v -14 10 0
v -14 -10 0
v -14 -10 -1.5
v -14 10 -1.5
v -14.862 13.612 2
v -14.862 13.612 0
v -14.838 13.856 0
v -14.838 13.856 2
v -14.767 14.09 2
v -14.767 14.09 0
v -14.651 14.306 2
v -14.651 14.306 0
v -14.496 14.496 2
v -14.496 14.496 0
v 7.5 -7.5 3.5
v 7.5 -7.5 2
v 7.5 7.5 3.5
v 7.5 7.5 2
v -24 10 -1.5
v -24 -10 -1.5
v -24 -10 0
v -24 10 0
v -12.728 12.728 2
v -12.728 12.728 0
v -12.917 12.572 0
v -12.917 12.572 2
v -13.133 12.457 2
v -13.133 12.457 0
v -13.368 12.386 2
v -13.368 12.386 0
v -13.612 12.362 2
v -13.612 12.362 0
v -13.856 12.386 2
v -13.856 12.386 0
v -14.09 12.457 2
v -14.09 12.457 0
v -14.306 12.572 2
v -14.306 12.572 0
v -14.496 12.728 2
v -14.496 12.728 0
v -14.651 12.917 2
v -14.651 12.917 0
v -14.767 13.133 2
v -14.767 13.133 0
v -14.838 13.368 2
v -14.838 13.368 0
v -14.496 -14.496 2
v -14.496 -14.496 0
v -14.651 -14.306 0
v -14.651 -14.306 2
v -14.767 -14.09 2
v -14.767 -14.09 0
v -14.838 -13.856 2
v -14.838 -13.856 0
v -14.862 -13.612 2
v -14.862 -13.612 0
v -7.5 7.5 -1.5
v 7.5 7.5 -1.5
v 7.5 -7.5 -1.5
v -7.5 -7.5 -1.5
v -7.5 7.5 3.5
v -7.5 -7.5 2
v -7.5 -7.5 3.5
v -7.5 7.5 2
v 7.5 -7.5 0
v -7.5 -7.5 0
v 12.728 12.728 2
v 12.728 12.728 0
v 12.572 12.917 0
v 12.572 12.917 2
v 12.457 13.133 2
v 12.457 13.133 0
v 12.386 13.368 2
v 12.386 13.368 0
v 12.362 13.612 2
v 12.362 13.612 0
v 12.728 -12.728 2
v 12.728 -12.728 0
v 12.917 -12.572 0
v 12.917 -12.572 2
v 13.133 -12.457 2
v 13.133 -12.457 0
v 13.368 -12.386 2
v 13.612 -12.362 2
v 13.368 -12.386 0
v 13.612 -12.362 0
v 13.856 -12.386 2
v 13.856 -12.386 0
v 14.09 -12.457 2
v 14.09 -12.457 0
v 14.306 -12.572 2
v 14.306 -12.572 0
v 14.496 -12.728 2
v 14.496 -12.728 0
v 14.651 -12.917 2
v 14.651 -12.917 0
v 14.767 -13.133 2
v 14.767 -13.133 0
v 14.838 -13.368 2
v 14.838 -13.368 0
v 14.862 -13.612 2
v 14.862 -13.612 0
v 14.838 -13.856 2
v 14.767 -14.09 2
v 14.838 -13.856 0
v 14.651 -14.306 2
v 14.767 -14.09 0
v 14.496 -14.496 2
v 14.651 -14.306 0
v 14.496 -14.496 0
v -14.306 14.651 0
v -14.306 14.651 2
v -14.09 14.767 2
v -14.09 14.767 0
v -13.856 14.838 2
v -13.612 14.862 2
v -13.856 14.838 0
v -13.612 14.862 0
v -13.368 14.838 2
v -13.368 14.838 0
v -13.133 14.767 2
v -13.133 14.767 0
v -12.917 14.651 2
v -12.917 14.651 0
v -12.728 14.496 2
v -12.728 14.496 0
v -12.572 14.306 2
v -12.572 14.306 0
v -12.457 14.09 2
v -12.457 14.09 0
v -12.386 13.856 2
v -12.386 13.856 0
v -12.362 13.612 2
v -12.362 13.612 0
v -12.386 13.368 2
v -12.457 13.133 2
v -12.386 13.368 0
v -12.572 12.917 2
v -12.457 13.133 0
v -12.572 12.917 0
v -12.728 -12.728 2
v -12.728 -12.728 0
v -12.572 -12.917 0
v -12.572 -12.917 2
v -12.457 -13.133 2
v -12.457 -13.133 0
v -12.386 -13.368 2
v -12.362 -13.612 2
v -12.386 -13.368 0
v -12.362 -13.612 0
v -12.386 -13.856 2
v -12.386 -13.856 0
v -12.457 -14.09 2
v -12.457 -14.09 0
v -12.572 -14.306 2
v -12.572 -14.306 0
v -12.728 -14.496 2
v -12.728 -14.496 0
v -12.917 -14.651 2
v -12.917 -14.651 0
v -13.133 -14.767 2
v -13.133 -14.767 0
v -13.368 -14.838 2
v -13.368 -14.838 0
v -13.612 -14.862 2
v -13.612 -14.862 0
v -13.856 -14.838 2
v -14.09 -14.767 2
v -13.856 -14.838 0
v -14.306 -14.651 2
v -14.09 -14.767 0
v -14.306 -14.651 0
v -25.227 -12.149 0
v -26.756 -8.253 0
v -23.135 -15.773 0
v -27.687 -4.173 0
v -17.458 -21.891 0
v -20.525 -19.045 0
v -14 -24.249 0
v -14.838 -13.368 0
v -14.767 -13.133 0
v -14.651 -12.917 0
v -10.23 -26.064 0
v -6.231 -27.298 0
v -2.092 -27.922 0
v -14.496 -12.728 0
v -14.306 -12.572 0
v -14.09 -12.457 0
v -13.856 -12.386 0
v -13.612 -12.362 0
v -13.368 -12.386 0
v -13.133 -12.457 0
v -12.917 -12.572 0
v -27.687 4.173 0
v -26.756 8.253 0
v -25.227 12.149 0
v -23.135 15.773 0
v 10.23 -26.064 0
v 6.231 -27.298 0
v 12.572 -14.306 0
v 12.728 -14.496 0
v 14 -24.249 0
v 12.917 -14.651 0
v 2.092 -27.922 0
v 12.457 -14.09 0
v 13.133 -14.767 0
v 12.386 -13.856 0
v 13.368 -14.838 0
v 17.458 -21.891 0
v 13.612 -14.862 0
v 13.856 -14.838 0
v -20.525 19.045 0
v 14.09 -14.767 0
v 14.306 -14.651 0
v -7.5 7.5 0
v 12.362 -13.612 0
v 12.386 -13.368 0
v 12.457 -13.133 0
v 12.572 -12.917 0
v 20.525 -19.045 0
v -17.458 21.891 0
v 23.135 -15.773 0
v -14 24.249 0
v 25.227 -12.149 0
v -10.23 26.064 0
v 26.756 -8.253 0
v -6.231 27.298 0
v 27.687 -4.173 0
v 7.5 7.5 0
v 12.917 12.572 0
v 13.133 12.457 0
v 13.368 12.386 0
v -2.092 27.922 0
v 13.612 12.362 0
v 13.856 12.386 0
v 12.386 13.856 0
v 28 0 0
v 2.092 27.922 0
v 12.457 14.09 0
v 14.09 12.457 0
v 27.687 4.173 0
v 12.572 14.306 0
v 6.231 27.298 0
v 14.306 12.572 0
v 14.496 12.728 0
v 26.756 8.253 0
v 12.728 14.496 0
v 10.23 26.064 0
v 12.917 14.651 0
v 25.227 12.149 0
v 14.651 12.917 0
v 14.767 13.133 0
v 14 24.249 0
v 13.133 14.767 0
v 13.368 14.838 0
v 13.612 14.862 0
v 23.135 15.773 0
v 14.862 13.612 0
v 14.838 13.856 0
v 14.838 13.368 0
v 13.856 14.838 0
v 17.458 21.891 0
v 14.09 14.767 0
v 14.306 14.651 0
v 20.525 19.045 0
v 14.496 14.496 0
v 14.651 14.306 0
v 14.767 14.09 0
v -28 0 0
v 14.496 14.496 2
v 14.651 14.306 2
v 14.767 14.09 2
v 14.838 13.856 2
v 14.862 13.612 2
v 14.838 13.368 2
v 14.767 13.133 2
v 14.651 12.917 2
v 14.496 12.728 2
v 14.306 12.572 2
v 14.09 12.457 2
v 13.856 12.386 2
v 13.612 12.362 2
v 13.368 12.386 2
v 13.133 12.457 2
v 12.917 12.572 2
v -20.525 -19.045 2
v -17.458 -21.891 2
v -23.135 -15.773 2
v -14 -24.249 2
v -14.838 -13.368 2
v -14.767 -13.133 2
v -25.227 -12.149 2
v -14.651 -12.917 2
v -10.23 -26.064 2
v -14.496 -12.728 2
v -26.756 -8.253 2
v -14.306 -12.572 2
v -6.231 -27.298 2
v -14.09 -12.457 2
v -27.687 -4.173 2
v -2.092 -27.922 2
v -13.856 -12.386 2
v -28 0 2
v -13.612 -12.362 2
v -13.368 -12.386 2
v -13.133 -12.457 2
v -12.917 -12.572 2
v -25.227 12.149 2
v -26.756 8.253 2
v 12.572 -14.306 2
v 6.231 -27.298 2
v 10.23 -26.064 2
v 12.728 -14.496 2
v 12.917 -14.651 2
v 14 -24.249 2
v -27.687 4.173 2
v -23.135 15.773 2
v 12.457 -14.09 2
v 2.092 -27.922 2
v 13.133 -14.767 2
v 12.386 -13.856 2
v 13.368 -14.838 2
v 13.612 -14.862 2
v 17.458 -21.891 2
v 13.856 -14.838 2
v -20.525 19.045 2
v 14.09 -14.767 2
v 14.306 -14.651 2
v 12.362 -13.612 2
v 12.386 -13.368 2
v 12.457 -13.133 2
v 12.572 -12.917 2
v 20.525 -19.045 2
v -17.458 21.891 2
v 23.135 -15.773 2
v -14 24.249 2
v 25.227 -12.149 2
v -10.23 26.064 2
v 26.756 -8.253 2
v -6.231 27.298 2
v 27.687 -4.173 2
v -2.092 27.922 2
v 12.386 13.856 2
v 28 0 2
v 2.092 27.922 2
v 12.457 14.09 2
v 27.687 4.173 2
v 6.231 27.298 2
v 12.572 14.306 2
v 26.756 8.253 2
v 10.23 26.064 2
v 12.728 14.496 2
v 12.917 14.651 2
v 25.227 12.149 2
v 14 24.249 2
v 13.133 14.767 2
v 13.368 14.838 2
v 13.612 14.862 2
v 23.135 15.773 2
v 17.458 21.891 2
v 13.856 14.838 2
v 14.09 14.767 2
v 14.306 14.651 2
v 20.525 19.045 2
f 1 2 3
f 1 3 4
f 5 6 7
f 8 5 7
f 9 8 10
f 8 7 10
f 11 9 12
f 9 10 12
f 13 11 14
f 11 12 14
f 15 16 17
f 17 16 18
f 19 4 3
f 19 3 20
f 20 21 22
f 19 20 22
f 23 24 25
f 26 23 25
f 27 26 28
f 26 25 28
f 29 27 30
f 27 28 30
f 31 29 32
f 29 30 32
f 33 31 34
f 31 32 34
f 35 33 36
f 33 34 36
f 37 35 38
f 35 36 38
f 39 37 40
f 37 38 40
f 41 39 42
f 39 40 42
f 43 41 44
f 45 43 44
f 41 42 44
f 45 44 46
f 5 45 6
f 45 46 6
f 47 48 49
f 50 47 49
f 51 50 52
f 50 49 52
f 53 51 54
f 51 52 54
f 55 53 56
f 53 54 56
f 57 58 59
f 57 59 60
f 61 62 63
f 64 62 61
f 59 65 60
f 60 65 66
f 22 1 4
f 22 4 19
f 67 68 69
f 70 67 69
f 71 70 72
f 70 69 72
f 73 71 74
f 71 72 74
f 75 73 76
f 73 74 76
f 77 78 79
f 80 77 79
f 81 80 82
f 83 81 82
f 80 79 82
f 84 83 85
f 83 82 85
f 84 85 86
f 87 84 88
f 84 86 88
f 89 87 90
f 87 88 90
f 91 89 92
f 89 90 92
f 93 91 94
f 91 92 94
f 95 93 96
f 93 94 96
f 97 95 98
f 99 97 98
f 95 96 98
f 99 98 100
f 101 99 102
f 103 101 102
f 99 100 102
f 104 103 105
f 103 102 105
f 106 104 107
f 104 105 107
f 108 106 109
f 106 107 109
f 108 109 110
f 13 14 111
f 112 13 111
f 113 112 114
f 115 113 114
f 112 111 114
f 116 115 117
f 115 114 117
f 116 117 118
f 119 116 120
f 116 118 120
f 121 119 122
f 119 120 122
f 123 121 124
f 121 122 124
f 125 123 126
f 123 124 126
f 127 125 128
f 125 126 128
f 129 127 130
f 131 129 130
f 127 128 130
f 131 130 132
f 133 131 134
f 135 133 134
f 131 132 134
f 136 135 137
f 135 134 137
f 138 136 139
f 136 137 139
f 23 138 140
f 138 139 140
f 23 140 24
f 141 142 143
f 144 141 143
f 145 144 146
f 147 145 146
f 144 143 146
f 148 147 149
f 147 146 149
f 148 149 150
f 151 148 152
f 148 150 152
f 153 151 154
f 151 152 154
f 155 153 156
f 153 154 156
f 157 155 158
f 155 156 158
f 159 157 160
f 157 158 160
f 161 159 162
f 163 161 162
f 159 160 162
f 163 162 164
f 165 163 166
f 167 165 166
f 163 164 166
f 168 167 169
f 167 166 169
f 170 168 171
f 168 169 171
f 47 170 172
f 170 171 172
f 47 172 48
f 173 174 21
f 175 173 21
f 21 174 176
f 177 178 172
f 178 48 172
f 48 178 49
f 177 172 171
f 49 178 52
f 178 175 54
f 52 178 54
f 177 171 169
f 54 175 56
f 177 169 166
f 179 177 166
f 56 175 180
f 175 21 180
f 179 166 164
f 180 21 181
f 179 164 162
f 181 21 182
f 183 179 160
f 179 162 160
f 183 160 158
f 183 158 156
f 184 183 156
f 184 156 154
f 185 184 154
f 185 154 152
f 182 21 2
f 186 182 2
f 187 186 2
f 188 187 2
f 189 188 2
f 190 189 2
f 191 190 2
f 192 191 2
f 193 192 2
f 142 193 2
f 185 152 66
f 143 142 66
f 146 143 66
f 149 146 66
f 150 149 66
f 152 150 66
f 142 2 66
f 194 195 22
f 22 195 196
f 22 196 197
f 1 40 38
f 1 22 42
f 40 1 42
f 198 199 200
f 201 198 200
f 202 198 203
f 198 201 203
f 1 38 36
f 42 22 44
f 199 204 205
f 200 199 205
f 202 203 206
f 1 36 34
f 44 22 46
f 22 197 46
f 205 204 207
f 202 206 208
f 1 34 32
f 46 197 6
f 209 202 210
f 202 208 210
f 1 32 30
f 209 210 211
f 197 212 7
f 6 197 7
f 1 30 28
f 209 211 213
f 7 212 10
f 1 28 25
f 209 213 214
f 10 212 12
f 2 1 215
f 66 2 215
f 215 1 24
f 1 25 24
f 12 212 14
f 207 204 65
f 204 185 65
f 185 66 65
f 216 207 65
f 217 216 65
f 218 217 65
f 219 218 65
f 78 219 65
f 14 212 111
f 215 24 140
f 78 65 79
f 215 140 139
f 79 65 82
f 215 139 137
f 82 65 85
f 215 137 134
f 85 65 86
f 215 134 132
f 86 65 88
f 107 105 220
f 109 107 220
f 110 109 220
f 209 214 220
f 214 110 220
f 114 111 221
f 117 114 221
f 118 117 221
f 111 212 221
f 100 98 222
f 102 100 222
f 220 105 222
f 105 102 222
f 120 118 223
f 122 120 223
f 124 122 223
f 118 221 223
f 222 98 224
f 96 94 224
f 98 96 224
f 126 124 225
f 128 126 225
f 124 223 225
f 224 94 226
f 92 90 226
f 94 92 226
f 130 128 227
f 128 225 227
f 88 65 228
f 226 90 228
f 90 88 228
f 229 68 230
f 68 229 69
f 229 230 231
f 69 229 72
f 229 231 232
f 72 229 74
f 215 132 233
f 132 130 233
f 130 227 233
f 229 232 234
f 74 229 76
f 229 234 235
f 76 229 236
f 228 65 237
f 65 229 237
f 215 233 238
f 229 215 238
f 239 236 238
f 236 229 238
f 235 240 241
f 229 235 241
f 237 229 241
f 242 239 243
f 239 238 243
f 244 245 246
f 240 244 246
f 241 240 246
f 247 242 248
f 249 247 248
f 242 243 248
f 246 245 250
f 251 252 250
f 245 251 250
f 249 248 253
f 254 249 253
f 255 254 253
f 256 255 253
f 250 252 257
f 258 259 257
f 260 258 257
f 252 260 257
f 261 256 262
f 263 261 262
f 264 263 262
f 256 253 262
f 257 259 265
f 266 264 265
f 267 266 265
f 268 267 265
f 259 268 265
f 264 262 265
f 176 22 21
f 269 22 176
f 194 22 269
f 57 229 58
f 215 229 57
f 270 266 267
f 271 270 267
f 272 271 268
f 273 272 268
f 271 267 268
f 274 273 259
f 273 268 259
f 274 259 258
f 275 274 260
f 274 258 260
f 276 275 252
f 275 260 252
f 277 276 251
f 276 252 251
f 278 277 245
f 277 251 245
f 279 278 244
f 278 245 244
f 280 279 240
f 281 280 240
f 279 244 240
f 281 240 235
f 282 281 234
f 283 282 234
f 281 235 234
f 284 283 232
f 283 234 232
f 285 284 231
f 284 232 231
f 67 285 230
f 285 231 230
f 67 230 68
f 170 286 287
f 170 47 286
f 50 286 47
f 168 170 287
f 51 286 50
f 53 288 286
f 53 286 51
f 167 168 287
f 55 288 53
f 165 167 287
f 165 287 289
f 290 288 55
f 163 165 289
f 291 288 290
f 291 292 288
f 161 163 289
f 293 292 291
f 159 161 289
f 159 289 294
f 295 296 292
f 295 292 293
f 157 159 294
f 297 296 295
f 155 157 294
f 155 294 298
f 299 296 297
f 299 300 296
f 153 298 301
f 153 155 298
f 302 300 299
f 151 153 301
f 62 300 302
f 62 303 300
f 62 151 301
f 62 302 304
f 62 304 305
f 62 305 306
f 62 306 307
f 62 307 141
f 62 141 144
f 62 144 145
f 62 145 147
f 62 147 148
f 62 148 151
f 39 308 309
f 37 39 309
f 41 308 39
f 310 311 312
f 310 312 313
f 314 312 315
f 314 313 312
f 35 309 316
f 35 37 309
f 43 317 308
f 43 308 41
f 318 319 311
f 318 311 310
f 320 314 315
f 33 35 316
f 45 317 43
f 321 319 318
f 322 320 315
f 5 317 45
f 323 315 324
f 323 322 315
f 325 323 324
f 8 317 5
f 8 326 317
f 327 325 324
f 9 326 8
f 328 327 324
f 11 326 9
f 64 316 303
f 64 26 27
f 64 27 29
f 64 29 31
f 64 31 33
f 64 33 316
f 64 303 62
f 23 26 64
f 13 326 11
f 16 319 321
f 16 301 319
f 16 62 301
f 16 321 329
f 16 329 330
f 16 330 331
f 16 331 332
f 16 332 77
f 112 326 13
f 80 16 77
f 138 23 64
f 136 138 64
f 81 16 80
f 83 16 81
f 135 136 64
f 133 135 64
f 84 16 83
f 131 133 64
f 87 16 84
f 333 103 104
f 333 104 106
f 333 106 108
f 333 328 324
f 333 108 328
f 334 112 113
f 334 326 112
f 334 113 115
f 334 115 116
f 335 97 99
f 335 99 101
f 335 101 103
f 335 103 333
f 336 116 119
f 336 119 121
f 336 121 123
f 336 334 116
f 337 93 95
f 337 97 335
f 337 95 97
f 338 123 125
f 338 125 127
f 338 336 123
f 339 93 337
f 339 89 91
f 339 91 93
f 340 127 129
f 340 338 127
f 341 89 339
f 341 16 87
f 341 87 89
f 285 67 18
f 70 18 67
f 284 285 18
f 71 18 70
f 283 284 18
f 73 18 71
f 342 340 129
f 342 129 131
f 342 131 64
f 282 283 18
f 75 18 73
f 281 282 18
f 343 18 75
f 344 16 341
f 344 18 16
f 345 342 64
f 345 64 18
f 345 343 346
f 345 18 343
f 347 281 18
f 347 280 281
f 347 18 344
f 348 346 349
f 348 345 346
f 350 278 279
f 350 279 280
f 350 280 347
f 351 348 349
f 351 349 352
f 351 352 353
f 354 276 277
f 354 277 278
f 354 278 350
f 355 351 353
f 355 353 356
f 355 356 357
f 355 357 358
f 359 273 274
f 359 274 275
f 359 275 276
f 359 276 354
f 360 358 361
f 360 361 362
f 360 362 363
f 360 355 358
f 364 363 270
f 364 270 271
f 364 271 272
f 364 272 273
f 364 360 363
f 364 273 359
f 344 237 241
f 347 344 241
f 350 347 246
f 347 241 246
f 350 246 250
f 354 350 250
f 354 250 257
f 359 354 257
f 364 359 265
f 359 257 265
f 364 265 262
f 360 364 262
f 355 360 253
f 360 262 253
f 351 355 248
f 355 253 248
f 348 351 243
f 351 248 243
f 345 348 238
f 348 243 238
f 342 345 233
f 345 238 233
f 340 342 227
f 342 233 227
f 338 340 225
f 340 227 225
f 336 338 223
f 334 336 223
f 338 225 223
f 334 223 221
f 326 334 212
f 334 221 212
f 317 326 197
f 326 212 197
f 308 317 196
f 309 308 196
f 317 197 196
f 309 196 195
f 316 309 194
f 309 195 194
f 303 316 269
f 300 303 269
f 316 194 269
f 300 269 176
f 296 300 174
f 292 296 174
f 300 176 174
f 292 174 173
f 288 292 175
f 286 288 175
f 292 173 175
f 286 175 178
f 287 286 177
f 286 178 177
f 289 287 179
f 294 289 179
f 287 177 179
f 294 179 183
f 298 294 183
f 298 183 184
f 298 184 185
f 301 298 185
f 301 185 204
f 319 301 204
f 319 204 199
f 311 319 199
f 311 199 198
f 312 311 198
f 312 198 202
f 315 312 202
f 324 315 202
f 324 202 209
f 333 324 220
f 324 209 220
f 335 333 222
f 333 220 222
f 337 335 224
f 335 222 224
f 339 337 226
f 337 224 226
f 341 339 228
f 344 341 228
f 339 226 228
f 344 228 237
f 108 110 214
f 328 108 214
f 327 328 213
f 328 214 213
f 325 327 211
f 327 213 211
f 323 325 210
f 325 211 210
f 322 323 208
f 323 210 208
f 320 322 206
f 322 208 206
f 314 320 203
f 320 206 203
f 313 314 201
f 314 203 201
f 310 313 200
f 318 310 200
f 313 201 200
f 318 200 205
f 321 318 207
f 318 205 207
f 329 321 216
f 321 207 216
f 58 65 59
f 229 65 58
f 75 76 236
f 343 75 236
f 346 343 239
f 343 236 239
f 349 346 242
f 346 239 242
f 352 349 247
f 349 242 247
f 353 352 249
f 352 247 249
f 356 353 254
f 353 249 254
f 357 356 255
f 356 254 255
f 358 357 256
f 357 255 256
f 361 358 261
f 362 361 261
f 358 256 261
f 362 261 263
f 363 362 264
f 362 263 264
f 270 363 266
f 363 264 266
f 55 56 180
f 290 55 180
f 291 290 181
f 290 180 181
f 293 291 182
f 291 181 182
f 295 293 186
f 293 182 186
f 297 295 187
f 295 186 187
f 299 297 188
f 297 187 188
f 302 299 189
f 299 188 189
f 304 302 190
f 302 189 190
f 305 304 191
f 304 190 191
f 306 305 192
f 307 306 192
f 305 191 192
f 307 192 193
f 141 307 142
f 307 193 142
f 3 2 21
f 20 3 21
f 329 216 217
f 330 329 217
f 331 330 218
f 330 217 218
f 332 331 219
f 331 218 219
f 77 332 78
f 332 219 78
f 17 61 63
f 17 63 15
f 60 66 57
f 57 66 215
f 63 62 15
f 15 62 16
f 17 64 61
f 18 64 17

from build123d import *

# Parameters (mm, degrees)
SKETCH_1_R          = 28
EXTRUDE_1_DEPTH     = 2
SKETCH_2_W          = 15
SKETCH_2_H          = 15
EXTRUDE_2_DEPTH     = 1.5
SKETCH_4_W          = 10
SKETCH_4_H          = 20
EXTRUDE_3_DEPTH     = 1.5
SKETCH_5_W          = 15
SKETCH_5_H          = 15
EXTRUDE_4_DEPTH     = 1.5
CUT_EXTRUDE_1_DEPTH = 10


with BuildPart() as part:
    # 草图1 → 凸台-拉伸1 (new body)
    with BuildSketch(Plane.XY):
        Circle(SKETCH_1_R)
    extrude(amount=EXTRUDE_1_DEPTH)

    # 草图2 → 凸台-拉伸2 (add)
    with BuildSketch(Plane.XY.offset(2)):
        Rectangle(SKETCH_2_W, SKETCH_2_H)
    extrude(amount=EXTRUDE_2_DEPTH)

    # 草图4 → 凸台-拉伸3 (add)
    with BuildSketch(Plane(origin=(0, 0, 0), x_dir=(-1, 0, 0), z_dir=(0, 0, -1))):
        with Locations((19, 0)):
            Rectangle(SKETCH_4_W, SKETCH_4_H)
    extrude(amount=EXTRUDE_3_DEPTH)

    # 草图5 → 凸台-拉伸4 (add)
    with BuildSketch(Plane(origin=(0, 0, 0), x_dir=(-1, 0, 0), z_dir=(0, 0, -1))):
        Rectangle(SKETCH_5_W, SKETCH_5_H)
    extrude(amount=EXTRUDE_4_DEPTH)

    # 草图6 → 切除-拉伸1 (cut)
    with BuildSketch(Plane(origin=(0, 0, 0), x_dir=(-1, 0, 0), z_dir=(0, 0, -1))):
        with BuildLine():
            ThreePointArc((-14.495689014, 14.495689014), (-14.495689014, 12.727922061), (-12.727922061, 12.727922061))
            Line((-12.727922061, 12.727922061), (-14.495689014, 14.495689014))
        make_face()
        with BuildLine():
            Line((-14.495689014, 14.495689014), (-12.727922061, 12.727922061))
            ThreePointArc((-12.727922061, 12.727922061), (-12.456956122, 13.133451247), (-12.361805538, 13.611805538))
            ThreePointArc((-12.361805538, 13.611805538), (-13.133451247, 14.766654953), (-14.495689014, 14.495689014))
        make_face()
        with BuildLine():
            ThreePointArc((-12.361805538, -13.611805538), (-12.456956122, -13.133451247), (-12.727922061, -12.727922061))
            Line((-12.727922061, -12.727922061), (-14.495689014, -14.495689014))
            ThreePointArc((-14.495689014, -14.495689014), (-13.133451247, -14.766654953), (-12.361805538, -13.611805538))
        make_face()
        with BuildLine():
            Line((-14.495689014, -14.495689014), (-12.727922061, -12.727922061))
            ThreePointArc((-12.727922061, -12.727922061), (-14.495689014, -12.727922061), (-14.495689014, -14.495689014))
        make_face()
        with BuildLine():
            ThreePointArc((14.861805538, -13.611805538), (14.090159828, -12.456956122), (12.727922061, -12.727922061))
            Line((12.727922061, -12.727922061), (14.495689014, -14.495689014))
            ThreePointArc((14.495689014, -14.495689014), (14.766654953, -14.090159828), (14.861805538, -13.611805538))
        make_face()
        with BuildLine():
            Line((14.495689014, -14.495689014), (12.727922061, -12.727922061))
            ThreePointArc((12.727922061, -12.727922061), (12.727922061, -14.495689014), (14.495689014, -14.495689014))
        make_face()
        with BuildLine():
            ThreePointArc((14.495689014, 14.495689014), (12.727922061, 14.495689014), (12.727922061, 12.727922061))
            Line((12.727922061, 12.727922061), (14.495689014, 14.495689014))
        make_face()
        with BuildLine():
            Line((14.495689014, 14.495689014), (12.727922061, 12.727922061))
            ThreePointArc((12.727922061, 12.727922061), (14.090159828, 12.456956122), (14.861805538, 13.611805538))
            ThreePointArc((14.861805538, 13.611805538), (14.766654953, 14.090159828), (14.495689014, 14.495689014))
        make_face()
    extrude(amount=-CUT_EXTRUDE_1_DEPTH, mode=Mode.SUBTRACT)


solid = part.part
